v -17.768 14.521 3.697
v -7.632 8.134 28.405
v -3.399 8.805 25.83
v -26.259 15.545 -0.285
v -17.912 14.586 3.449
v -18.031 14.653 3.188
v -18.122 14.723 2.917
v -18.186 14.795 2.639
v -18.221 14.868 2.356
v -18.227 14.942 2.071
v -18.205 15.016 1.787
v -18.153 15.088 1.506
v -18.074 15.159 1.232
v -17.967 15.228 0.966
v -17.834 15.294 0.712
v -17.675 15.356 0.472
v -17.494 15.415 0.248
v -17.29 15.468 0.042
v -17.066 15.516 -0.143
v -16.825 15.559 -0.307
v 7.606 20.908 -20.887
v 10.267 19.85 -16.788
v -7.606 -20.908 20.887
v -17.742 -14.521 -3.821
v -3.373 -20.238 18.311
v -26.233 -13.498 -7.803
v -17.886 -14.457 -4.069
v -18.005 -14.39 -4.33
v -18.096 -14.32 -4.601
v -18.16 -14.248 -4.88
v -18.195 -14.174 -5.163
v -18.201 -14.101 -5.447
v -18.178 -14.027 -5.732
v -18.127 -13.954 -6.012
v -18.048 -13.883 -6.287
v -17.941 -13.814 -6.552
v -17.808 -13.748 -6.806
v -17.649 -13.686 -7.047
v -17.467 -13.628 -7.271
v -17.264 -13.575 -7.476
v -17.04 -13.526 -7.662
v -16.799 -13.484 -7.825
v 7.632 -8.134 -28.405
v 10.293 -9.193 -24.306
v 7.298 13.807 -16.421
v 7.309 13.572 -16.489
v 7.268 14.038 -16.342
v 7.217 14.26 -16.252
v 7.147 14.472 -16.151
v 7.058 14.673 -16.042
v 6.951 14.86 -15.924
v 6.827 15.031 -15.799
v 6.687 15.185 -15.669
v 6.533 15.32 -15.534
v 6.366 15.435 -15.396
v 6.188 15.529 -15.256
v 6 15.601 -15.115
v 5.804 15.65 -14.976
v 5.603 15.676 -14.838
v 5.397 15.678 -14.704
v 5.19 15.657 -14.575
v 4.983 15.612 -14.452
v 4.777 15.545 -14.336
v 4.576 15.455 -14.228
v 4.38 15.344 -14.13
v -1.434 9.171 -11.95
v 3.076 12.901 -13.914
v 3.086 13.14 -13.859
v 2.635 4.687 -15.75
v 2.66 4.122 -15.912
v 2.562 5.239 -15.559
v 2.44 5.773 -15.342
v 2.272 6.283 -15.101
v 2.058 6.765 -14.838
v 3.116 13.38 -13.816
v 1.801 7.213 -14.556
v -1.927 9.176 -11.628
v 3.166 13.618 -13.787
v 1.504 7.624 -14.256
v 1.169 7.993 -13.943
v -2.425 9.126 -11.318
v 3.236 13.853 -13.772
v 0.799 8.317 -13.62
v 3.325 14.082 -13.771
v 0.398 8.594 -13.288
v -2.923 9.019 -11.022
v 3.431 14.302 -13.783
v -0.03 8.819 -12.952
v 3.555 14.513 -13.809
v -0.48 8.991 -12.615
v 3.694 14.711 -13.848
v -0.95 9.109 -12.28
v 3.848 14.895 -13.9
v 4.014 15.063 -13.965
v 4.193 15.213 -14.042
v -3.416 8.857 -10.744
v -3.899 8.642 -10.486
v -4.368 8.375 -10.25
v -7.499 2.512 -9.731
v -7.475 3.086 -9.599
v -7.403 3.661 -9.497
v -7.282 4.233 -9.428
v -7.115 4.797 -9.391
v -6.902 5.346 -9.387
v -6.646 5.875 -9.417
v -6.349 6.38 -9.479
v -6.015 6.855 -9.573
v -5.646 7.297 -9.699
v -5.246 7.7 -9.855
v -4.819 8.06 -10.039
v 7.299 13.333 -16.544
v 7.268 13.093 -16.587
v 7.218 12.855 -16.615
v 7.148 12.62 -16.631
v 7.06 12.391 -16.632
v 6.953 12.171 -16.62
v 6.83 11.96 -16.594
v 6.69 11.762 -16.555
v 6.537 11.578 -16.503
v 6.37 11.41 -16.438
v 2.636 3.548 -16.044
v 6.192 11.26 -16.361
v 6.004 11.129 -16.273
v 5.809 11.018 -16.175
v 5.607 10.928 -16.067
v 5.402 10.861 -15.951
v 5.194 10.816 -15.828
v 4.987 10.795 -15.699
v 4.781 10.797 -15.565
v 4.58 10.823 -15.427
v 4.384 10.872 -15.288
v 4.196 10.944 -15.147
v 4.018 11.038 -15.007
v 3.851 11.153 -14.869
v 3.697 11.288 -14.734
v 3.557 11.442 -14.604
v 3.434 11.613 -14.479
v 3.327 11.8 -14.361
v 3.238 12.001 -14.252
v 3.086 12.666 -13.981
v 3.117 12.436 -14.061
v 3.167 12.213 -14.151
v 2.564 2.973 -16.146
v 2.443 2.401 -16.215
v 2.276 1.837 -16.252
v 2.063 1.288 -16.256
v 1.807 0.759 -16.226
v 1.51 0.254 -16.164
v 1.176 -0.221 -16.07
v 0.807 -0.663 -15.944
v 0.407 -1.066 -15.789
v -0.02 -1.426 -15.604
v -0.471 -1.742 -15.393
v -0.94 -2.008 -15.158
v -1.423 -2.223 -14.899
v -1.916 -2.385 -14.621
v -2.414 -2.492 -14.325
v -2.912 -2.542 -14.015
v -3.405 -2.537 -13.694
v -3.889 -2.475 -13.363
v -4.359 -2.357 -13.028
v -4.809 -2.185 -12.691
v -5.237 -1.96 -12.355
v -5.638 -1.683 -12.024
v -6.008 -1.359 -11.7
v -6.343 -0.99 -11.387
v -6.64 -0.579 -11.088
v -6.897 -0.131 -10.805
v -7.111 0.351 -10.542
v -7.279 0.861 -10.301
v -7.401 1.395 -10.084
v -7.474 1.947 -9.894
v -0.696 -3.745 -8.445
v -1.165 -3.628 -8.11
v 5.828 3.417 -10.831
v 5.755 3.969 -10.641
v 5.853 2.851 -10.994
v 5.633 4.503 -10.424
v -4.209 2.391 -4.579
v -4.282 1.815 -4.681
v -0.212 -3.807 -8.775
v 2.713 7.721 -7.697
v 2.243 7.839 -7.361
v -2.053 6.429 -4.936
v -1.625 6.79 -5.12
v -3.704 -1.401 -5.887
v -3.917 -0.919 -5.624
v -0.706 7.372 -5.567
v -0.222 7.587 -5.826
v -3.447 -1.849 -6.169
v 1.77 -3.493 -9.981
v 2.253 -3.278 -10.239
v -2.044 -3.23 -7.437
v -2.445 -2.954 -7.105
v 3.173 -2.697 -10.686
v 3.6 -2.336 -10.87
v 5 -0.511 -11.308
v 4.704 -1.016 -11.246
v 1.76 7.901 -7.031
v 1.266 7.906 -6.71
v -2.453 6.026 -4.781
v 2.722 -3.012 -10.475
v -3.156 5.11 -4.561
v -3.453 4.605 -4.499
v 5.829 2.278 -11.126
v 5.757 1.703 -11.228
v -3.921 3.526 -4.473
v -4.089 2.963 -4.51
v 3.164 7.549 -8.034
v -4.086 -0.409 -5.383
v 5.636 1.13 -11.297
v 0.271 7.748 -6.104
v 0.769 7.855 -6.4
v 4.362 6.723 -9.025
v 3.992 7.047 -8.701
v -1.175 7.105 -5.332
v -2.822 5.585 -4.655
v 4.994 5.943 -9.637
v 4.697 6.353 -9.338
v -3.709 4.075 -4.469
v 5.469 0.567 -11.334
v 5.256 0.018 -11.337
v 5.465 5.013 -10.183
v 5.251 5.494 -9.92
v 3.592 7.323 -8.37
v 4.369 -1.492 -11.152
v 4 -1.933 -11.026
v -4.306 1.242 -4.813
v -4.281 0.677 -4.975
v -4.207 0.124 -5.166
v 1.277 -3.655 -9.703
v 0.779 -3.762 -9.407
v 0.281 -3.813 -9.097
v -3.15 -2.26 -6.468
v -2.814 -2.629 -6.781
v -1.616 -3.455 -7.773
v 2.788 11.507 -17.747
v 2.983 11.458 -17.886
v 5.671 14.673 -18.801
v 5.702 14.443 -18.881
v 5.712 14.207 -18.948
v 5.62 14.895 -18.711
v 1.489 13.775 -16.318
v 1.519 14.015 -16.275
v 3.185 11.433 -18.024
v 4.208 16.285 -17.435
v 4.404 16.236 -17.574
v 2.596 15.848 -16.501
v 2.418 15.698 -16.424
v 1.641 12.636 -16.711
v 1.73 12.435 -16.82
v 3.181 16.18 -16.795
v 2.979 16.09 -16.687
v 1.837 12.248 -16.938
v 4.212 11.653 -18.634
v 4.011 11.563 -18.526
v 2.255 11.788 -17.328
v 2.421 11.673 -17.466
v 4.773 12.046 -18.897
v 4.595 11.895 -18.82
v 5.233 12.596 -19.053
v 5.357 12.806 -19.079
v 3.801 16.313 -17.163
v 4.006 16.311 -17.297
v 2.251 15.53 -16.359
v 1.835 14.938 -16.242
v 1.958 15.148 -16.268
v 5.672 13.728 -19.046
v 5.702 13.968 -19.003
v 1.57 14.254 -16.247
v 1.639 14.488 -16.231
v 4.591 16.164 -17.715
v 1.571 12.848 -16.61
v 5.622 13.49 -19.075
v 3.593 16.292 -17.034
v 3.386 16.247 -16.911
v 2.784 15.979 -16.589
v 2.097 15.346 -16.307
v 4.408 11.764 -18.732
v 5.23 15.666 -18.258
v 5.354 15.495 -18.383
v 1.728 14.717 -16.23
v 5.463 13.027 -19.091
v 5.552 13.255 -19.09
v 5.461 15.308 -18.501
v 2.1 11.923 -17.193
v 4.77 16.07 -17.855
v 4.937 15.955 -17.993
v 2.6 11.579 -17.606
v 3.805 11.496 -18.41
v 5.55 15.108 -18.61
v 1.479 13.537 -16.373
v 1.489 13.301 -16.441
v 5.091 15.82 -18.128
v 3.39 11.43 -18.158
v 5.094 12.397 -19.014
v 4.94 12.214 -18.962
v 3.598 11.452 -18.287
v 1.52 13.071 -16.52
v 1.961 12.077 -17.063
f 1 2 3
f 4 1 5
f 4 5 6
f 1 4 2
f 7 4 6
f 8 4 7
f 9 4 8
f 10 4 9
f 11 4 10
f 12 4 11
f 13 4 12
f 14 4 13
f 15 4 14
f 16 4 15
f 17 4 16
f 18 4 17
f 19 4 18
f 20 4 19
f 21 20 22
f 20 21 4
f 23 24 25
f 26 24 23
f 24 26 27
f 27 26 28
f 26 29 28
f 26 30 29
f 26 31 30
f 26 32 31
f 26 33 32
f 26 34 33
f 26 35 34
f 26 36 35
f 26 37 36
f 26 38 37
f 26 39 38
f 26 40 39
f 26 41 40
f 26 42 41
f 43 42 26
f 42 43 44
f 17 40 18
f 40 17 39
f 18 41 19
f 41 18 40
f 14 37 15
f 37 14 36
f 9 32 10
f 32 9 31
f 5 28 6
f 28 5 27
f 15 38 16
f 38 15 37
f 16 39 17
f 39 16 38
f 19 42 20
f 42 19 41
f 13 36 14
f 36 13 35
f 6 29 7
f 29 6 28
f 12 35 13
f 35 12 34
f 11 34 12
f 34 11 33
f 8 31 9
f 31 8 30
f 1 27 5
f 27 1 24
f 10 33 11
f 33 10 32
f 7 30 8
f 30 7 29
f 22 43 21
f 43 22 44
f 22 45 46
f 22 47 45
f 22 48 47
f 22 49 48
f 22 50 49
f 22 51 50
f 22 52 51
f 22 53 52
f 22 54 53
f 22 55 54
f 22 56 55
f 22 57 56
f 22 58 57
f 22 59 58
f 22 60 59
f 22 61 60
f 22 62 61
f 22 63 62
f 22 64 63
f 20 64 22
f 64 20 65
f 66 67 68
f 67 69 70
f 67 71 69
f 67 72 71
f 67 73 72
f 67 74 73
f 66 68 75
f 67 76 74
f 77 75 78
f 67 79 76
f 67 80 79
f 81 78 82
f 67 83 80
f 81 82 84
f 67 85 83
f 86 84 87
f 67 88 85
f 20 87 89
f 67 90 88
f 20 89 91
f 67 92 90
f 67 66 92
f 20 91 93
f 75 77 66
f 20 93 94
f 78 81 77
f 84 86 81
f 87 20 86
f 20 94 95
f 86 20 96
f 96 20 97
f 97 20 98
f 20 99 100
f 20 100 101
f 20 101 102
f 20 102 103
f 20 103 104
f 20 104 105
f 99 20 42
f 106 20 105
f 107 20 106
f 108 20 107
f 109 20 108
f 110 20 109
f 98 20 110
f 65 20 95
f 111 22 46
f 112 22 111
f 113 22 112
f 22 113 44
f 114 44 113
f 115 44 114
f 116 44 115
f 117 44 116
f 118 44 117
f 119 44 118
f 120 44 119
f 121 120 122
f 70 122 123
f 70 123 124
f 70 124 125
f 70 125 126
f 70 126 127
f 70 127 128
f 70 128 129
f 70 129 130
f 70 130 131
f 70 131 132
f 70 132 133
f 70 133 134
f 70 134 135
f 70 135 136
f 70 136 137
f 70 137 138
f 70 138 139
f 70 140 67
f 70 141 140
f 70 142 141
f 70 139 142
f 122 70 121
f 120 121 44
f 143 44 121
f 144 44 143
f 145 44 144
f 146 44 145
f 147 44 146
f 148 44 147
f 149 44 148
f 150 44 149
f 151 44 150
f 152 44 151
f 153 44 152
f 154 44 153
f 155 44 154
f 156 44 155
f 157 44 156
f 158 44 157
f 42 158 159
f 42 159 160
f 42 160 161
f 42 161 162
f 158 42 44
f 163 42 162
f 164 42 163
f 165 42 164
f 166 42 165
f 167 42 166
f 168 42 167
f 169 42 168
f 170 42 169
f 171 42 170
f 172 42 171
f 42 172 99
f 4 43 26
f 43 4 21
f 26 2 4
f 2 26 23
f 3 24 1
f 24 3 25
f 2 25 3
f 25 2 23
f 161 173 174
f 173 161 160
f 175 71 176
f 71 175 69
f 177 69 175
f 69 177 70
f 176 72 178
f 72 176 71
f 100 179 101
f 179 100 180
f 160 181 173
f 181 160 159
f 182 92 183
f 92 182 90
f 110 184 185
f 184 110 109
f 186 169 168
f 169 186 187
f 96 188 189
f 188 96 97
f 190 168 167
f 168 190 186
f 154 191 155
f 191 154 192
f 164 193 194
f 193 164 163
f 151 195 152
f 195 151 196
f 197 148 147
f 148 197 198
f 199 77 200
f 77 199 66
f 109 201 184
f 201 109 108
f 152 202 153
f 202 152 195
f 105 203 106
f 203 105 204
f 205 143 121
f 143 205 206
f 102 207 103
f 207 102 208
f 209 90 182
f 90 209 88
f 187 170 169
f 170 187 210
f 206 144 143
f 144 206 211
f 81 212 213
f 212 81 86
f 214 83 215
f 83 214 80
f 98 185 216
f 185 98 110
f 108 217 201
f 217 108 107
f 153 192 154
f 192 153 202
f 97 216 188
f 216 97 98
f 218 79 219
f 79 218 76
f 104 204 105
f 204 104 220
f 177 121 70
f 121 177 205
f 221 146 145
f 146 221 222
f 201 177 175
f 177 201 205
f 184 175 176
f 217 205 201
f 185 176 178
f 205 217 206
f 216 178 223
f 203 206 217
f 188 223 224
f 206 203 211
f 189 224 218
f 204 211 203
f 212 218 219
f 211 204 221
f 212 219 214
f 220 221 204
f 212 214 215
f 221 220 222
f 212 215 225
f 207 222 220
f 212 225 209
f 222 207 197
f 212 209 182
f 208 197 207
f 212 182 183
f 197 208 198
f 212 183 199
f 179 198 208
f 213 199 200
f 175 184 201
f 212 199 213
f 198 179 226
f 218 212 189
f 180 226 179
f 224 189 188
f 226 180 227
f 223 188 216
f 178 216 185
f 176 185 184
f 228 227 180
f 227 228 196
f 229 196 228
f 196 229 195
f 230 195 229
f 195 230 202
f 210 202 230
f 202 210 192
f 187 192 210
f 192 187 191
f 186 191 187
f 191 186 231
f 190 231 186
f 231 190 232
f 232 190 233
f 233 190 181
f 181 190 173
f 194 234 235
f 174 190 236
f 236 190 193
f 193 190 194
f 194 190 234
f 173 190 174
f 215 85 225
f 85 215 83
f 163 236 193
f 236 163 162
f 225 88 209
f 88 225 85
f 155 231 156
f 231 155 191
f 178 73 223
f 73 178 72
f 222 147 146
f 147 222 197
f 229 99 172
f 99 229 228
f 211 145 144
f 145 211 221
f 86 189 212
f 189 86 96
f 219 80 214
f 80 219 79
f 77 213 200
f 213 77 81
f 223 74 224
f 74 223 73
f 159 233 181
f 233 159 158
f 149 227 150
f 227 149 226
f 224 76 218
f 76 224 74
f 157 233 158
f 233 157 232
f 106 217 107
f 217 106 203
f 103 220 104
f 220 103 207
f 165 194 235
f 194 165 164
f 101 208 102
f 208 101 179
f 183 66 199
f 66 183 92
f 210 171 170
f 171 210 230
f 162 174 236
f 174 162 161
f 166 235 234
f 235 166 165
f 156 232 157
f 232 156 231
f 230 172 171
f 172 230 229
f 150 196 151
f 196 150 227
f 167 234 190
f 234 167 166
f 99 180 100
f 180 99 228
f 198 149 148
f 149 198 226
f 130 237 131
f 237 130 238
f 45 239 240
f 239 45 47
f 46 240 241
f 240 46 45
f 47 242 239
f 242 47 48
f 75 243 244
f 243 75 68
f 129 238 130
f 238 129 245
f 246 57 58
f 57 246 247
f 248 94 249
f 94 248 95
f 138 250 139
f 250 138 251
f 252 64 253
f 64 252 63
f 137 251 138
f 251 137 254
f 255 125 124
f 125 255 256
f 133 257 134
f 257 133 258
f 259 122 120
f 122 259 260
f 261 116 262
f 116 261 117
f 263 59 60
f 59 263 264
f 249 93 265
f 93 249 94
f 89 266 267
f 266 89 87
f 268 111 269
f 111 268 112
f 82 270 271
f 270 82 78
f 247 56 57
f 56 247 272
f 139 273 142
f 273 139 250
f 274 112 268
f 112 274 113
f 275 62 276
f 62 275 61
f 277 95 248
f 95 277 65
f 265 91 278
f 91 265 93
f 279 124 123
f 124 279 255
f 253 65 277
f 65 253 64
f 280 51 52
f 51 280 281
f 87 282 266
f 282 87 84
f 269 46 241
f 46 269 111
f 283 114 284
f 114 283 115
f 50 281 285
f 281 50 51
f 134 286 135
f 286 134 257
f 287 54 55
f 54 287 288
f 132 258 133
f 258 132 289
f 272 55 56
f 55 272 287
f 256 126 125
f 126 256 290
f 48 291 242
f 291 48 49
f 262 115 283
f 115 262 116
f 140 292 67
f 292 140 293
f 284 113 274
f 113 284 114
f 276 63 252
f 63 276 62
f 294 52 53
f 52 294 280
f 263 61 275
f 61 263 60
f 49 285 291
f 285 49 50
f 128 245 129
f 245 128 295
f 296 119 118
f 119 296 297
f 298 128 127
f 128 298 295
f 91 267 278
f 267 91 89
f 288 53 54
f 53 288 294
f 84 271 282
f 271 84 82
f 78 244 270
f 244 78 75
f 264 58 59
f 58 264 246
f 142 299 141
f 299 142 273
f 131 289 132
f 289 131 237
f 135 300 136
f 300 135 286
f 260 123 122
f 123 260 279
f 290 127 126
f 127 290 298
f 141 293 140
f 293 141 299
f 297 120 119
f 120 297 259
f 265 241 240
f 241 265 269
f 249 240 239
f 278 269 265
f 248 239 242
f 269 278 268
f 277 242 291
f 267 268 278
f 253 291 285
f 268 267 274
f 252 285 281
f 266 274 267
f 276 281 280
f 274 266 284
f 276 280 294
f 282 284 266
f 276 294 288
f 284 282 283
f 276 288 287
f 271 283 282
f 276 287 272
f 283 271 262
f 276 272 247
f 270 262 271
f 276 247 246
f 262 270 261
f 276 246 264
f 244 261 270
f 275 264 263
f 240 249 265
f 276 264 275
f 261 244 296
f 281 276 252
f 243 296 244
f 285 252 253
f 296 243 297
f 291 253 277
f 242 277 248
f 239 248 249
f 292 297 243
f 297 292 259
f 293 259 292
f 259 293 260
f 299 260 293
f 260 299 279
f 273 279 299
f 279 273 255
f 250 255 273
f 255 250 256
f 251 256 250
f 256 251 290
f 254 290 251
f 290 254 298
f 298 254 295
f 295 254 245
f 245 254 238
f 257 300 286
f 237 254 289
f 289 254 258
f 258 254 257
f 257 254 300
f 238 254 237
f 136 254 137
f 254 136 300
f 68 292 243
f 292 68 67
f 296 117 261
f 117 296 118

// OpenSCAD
// file: composite_bracket.scad
// Composite bracket: ground truth for the segmentation pipeline.
// See docs/planning/segmentation_composite_bracket.md and composite_bracket_expected.json.
// Hand-written (not generated from the feature-fixture manifest).
$fn = 64;

module composite_bracket() {
    difference() {
        union() {
            cube([40, 30, 5]);                          // base
            cube([5, 30, 35]);                          // wall
            difference() {                              // R3 fillet, inner corner, axis Y
                translate([4, 0, 4]) cube([4, 30, 4]);
                translate([8, -1, 8]) rotate([-90, 0, 0]) cylinder(r = 3, h = 32);
            }
            translate([25, 15, 4]) cylinder(r = 6, h = 7);   // boss, top at z = 11
        }
        translate([34, 24, 2]) cylinder(r = 2.5, h = 4);     // blind hole, floor at z = 2
    }
}

composite_bracket();
// main file
// Rotated variant of composite_bracket.scad. The transform must match
// "variants" in composite_bracket_expected.json.
use <composite_bracket.scad>
$fn = 64;

rotate([17, 31, 9]) translate([-20, -15, -17.5]) composite_bracket();
